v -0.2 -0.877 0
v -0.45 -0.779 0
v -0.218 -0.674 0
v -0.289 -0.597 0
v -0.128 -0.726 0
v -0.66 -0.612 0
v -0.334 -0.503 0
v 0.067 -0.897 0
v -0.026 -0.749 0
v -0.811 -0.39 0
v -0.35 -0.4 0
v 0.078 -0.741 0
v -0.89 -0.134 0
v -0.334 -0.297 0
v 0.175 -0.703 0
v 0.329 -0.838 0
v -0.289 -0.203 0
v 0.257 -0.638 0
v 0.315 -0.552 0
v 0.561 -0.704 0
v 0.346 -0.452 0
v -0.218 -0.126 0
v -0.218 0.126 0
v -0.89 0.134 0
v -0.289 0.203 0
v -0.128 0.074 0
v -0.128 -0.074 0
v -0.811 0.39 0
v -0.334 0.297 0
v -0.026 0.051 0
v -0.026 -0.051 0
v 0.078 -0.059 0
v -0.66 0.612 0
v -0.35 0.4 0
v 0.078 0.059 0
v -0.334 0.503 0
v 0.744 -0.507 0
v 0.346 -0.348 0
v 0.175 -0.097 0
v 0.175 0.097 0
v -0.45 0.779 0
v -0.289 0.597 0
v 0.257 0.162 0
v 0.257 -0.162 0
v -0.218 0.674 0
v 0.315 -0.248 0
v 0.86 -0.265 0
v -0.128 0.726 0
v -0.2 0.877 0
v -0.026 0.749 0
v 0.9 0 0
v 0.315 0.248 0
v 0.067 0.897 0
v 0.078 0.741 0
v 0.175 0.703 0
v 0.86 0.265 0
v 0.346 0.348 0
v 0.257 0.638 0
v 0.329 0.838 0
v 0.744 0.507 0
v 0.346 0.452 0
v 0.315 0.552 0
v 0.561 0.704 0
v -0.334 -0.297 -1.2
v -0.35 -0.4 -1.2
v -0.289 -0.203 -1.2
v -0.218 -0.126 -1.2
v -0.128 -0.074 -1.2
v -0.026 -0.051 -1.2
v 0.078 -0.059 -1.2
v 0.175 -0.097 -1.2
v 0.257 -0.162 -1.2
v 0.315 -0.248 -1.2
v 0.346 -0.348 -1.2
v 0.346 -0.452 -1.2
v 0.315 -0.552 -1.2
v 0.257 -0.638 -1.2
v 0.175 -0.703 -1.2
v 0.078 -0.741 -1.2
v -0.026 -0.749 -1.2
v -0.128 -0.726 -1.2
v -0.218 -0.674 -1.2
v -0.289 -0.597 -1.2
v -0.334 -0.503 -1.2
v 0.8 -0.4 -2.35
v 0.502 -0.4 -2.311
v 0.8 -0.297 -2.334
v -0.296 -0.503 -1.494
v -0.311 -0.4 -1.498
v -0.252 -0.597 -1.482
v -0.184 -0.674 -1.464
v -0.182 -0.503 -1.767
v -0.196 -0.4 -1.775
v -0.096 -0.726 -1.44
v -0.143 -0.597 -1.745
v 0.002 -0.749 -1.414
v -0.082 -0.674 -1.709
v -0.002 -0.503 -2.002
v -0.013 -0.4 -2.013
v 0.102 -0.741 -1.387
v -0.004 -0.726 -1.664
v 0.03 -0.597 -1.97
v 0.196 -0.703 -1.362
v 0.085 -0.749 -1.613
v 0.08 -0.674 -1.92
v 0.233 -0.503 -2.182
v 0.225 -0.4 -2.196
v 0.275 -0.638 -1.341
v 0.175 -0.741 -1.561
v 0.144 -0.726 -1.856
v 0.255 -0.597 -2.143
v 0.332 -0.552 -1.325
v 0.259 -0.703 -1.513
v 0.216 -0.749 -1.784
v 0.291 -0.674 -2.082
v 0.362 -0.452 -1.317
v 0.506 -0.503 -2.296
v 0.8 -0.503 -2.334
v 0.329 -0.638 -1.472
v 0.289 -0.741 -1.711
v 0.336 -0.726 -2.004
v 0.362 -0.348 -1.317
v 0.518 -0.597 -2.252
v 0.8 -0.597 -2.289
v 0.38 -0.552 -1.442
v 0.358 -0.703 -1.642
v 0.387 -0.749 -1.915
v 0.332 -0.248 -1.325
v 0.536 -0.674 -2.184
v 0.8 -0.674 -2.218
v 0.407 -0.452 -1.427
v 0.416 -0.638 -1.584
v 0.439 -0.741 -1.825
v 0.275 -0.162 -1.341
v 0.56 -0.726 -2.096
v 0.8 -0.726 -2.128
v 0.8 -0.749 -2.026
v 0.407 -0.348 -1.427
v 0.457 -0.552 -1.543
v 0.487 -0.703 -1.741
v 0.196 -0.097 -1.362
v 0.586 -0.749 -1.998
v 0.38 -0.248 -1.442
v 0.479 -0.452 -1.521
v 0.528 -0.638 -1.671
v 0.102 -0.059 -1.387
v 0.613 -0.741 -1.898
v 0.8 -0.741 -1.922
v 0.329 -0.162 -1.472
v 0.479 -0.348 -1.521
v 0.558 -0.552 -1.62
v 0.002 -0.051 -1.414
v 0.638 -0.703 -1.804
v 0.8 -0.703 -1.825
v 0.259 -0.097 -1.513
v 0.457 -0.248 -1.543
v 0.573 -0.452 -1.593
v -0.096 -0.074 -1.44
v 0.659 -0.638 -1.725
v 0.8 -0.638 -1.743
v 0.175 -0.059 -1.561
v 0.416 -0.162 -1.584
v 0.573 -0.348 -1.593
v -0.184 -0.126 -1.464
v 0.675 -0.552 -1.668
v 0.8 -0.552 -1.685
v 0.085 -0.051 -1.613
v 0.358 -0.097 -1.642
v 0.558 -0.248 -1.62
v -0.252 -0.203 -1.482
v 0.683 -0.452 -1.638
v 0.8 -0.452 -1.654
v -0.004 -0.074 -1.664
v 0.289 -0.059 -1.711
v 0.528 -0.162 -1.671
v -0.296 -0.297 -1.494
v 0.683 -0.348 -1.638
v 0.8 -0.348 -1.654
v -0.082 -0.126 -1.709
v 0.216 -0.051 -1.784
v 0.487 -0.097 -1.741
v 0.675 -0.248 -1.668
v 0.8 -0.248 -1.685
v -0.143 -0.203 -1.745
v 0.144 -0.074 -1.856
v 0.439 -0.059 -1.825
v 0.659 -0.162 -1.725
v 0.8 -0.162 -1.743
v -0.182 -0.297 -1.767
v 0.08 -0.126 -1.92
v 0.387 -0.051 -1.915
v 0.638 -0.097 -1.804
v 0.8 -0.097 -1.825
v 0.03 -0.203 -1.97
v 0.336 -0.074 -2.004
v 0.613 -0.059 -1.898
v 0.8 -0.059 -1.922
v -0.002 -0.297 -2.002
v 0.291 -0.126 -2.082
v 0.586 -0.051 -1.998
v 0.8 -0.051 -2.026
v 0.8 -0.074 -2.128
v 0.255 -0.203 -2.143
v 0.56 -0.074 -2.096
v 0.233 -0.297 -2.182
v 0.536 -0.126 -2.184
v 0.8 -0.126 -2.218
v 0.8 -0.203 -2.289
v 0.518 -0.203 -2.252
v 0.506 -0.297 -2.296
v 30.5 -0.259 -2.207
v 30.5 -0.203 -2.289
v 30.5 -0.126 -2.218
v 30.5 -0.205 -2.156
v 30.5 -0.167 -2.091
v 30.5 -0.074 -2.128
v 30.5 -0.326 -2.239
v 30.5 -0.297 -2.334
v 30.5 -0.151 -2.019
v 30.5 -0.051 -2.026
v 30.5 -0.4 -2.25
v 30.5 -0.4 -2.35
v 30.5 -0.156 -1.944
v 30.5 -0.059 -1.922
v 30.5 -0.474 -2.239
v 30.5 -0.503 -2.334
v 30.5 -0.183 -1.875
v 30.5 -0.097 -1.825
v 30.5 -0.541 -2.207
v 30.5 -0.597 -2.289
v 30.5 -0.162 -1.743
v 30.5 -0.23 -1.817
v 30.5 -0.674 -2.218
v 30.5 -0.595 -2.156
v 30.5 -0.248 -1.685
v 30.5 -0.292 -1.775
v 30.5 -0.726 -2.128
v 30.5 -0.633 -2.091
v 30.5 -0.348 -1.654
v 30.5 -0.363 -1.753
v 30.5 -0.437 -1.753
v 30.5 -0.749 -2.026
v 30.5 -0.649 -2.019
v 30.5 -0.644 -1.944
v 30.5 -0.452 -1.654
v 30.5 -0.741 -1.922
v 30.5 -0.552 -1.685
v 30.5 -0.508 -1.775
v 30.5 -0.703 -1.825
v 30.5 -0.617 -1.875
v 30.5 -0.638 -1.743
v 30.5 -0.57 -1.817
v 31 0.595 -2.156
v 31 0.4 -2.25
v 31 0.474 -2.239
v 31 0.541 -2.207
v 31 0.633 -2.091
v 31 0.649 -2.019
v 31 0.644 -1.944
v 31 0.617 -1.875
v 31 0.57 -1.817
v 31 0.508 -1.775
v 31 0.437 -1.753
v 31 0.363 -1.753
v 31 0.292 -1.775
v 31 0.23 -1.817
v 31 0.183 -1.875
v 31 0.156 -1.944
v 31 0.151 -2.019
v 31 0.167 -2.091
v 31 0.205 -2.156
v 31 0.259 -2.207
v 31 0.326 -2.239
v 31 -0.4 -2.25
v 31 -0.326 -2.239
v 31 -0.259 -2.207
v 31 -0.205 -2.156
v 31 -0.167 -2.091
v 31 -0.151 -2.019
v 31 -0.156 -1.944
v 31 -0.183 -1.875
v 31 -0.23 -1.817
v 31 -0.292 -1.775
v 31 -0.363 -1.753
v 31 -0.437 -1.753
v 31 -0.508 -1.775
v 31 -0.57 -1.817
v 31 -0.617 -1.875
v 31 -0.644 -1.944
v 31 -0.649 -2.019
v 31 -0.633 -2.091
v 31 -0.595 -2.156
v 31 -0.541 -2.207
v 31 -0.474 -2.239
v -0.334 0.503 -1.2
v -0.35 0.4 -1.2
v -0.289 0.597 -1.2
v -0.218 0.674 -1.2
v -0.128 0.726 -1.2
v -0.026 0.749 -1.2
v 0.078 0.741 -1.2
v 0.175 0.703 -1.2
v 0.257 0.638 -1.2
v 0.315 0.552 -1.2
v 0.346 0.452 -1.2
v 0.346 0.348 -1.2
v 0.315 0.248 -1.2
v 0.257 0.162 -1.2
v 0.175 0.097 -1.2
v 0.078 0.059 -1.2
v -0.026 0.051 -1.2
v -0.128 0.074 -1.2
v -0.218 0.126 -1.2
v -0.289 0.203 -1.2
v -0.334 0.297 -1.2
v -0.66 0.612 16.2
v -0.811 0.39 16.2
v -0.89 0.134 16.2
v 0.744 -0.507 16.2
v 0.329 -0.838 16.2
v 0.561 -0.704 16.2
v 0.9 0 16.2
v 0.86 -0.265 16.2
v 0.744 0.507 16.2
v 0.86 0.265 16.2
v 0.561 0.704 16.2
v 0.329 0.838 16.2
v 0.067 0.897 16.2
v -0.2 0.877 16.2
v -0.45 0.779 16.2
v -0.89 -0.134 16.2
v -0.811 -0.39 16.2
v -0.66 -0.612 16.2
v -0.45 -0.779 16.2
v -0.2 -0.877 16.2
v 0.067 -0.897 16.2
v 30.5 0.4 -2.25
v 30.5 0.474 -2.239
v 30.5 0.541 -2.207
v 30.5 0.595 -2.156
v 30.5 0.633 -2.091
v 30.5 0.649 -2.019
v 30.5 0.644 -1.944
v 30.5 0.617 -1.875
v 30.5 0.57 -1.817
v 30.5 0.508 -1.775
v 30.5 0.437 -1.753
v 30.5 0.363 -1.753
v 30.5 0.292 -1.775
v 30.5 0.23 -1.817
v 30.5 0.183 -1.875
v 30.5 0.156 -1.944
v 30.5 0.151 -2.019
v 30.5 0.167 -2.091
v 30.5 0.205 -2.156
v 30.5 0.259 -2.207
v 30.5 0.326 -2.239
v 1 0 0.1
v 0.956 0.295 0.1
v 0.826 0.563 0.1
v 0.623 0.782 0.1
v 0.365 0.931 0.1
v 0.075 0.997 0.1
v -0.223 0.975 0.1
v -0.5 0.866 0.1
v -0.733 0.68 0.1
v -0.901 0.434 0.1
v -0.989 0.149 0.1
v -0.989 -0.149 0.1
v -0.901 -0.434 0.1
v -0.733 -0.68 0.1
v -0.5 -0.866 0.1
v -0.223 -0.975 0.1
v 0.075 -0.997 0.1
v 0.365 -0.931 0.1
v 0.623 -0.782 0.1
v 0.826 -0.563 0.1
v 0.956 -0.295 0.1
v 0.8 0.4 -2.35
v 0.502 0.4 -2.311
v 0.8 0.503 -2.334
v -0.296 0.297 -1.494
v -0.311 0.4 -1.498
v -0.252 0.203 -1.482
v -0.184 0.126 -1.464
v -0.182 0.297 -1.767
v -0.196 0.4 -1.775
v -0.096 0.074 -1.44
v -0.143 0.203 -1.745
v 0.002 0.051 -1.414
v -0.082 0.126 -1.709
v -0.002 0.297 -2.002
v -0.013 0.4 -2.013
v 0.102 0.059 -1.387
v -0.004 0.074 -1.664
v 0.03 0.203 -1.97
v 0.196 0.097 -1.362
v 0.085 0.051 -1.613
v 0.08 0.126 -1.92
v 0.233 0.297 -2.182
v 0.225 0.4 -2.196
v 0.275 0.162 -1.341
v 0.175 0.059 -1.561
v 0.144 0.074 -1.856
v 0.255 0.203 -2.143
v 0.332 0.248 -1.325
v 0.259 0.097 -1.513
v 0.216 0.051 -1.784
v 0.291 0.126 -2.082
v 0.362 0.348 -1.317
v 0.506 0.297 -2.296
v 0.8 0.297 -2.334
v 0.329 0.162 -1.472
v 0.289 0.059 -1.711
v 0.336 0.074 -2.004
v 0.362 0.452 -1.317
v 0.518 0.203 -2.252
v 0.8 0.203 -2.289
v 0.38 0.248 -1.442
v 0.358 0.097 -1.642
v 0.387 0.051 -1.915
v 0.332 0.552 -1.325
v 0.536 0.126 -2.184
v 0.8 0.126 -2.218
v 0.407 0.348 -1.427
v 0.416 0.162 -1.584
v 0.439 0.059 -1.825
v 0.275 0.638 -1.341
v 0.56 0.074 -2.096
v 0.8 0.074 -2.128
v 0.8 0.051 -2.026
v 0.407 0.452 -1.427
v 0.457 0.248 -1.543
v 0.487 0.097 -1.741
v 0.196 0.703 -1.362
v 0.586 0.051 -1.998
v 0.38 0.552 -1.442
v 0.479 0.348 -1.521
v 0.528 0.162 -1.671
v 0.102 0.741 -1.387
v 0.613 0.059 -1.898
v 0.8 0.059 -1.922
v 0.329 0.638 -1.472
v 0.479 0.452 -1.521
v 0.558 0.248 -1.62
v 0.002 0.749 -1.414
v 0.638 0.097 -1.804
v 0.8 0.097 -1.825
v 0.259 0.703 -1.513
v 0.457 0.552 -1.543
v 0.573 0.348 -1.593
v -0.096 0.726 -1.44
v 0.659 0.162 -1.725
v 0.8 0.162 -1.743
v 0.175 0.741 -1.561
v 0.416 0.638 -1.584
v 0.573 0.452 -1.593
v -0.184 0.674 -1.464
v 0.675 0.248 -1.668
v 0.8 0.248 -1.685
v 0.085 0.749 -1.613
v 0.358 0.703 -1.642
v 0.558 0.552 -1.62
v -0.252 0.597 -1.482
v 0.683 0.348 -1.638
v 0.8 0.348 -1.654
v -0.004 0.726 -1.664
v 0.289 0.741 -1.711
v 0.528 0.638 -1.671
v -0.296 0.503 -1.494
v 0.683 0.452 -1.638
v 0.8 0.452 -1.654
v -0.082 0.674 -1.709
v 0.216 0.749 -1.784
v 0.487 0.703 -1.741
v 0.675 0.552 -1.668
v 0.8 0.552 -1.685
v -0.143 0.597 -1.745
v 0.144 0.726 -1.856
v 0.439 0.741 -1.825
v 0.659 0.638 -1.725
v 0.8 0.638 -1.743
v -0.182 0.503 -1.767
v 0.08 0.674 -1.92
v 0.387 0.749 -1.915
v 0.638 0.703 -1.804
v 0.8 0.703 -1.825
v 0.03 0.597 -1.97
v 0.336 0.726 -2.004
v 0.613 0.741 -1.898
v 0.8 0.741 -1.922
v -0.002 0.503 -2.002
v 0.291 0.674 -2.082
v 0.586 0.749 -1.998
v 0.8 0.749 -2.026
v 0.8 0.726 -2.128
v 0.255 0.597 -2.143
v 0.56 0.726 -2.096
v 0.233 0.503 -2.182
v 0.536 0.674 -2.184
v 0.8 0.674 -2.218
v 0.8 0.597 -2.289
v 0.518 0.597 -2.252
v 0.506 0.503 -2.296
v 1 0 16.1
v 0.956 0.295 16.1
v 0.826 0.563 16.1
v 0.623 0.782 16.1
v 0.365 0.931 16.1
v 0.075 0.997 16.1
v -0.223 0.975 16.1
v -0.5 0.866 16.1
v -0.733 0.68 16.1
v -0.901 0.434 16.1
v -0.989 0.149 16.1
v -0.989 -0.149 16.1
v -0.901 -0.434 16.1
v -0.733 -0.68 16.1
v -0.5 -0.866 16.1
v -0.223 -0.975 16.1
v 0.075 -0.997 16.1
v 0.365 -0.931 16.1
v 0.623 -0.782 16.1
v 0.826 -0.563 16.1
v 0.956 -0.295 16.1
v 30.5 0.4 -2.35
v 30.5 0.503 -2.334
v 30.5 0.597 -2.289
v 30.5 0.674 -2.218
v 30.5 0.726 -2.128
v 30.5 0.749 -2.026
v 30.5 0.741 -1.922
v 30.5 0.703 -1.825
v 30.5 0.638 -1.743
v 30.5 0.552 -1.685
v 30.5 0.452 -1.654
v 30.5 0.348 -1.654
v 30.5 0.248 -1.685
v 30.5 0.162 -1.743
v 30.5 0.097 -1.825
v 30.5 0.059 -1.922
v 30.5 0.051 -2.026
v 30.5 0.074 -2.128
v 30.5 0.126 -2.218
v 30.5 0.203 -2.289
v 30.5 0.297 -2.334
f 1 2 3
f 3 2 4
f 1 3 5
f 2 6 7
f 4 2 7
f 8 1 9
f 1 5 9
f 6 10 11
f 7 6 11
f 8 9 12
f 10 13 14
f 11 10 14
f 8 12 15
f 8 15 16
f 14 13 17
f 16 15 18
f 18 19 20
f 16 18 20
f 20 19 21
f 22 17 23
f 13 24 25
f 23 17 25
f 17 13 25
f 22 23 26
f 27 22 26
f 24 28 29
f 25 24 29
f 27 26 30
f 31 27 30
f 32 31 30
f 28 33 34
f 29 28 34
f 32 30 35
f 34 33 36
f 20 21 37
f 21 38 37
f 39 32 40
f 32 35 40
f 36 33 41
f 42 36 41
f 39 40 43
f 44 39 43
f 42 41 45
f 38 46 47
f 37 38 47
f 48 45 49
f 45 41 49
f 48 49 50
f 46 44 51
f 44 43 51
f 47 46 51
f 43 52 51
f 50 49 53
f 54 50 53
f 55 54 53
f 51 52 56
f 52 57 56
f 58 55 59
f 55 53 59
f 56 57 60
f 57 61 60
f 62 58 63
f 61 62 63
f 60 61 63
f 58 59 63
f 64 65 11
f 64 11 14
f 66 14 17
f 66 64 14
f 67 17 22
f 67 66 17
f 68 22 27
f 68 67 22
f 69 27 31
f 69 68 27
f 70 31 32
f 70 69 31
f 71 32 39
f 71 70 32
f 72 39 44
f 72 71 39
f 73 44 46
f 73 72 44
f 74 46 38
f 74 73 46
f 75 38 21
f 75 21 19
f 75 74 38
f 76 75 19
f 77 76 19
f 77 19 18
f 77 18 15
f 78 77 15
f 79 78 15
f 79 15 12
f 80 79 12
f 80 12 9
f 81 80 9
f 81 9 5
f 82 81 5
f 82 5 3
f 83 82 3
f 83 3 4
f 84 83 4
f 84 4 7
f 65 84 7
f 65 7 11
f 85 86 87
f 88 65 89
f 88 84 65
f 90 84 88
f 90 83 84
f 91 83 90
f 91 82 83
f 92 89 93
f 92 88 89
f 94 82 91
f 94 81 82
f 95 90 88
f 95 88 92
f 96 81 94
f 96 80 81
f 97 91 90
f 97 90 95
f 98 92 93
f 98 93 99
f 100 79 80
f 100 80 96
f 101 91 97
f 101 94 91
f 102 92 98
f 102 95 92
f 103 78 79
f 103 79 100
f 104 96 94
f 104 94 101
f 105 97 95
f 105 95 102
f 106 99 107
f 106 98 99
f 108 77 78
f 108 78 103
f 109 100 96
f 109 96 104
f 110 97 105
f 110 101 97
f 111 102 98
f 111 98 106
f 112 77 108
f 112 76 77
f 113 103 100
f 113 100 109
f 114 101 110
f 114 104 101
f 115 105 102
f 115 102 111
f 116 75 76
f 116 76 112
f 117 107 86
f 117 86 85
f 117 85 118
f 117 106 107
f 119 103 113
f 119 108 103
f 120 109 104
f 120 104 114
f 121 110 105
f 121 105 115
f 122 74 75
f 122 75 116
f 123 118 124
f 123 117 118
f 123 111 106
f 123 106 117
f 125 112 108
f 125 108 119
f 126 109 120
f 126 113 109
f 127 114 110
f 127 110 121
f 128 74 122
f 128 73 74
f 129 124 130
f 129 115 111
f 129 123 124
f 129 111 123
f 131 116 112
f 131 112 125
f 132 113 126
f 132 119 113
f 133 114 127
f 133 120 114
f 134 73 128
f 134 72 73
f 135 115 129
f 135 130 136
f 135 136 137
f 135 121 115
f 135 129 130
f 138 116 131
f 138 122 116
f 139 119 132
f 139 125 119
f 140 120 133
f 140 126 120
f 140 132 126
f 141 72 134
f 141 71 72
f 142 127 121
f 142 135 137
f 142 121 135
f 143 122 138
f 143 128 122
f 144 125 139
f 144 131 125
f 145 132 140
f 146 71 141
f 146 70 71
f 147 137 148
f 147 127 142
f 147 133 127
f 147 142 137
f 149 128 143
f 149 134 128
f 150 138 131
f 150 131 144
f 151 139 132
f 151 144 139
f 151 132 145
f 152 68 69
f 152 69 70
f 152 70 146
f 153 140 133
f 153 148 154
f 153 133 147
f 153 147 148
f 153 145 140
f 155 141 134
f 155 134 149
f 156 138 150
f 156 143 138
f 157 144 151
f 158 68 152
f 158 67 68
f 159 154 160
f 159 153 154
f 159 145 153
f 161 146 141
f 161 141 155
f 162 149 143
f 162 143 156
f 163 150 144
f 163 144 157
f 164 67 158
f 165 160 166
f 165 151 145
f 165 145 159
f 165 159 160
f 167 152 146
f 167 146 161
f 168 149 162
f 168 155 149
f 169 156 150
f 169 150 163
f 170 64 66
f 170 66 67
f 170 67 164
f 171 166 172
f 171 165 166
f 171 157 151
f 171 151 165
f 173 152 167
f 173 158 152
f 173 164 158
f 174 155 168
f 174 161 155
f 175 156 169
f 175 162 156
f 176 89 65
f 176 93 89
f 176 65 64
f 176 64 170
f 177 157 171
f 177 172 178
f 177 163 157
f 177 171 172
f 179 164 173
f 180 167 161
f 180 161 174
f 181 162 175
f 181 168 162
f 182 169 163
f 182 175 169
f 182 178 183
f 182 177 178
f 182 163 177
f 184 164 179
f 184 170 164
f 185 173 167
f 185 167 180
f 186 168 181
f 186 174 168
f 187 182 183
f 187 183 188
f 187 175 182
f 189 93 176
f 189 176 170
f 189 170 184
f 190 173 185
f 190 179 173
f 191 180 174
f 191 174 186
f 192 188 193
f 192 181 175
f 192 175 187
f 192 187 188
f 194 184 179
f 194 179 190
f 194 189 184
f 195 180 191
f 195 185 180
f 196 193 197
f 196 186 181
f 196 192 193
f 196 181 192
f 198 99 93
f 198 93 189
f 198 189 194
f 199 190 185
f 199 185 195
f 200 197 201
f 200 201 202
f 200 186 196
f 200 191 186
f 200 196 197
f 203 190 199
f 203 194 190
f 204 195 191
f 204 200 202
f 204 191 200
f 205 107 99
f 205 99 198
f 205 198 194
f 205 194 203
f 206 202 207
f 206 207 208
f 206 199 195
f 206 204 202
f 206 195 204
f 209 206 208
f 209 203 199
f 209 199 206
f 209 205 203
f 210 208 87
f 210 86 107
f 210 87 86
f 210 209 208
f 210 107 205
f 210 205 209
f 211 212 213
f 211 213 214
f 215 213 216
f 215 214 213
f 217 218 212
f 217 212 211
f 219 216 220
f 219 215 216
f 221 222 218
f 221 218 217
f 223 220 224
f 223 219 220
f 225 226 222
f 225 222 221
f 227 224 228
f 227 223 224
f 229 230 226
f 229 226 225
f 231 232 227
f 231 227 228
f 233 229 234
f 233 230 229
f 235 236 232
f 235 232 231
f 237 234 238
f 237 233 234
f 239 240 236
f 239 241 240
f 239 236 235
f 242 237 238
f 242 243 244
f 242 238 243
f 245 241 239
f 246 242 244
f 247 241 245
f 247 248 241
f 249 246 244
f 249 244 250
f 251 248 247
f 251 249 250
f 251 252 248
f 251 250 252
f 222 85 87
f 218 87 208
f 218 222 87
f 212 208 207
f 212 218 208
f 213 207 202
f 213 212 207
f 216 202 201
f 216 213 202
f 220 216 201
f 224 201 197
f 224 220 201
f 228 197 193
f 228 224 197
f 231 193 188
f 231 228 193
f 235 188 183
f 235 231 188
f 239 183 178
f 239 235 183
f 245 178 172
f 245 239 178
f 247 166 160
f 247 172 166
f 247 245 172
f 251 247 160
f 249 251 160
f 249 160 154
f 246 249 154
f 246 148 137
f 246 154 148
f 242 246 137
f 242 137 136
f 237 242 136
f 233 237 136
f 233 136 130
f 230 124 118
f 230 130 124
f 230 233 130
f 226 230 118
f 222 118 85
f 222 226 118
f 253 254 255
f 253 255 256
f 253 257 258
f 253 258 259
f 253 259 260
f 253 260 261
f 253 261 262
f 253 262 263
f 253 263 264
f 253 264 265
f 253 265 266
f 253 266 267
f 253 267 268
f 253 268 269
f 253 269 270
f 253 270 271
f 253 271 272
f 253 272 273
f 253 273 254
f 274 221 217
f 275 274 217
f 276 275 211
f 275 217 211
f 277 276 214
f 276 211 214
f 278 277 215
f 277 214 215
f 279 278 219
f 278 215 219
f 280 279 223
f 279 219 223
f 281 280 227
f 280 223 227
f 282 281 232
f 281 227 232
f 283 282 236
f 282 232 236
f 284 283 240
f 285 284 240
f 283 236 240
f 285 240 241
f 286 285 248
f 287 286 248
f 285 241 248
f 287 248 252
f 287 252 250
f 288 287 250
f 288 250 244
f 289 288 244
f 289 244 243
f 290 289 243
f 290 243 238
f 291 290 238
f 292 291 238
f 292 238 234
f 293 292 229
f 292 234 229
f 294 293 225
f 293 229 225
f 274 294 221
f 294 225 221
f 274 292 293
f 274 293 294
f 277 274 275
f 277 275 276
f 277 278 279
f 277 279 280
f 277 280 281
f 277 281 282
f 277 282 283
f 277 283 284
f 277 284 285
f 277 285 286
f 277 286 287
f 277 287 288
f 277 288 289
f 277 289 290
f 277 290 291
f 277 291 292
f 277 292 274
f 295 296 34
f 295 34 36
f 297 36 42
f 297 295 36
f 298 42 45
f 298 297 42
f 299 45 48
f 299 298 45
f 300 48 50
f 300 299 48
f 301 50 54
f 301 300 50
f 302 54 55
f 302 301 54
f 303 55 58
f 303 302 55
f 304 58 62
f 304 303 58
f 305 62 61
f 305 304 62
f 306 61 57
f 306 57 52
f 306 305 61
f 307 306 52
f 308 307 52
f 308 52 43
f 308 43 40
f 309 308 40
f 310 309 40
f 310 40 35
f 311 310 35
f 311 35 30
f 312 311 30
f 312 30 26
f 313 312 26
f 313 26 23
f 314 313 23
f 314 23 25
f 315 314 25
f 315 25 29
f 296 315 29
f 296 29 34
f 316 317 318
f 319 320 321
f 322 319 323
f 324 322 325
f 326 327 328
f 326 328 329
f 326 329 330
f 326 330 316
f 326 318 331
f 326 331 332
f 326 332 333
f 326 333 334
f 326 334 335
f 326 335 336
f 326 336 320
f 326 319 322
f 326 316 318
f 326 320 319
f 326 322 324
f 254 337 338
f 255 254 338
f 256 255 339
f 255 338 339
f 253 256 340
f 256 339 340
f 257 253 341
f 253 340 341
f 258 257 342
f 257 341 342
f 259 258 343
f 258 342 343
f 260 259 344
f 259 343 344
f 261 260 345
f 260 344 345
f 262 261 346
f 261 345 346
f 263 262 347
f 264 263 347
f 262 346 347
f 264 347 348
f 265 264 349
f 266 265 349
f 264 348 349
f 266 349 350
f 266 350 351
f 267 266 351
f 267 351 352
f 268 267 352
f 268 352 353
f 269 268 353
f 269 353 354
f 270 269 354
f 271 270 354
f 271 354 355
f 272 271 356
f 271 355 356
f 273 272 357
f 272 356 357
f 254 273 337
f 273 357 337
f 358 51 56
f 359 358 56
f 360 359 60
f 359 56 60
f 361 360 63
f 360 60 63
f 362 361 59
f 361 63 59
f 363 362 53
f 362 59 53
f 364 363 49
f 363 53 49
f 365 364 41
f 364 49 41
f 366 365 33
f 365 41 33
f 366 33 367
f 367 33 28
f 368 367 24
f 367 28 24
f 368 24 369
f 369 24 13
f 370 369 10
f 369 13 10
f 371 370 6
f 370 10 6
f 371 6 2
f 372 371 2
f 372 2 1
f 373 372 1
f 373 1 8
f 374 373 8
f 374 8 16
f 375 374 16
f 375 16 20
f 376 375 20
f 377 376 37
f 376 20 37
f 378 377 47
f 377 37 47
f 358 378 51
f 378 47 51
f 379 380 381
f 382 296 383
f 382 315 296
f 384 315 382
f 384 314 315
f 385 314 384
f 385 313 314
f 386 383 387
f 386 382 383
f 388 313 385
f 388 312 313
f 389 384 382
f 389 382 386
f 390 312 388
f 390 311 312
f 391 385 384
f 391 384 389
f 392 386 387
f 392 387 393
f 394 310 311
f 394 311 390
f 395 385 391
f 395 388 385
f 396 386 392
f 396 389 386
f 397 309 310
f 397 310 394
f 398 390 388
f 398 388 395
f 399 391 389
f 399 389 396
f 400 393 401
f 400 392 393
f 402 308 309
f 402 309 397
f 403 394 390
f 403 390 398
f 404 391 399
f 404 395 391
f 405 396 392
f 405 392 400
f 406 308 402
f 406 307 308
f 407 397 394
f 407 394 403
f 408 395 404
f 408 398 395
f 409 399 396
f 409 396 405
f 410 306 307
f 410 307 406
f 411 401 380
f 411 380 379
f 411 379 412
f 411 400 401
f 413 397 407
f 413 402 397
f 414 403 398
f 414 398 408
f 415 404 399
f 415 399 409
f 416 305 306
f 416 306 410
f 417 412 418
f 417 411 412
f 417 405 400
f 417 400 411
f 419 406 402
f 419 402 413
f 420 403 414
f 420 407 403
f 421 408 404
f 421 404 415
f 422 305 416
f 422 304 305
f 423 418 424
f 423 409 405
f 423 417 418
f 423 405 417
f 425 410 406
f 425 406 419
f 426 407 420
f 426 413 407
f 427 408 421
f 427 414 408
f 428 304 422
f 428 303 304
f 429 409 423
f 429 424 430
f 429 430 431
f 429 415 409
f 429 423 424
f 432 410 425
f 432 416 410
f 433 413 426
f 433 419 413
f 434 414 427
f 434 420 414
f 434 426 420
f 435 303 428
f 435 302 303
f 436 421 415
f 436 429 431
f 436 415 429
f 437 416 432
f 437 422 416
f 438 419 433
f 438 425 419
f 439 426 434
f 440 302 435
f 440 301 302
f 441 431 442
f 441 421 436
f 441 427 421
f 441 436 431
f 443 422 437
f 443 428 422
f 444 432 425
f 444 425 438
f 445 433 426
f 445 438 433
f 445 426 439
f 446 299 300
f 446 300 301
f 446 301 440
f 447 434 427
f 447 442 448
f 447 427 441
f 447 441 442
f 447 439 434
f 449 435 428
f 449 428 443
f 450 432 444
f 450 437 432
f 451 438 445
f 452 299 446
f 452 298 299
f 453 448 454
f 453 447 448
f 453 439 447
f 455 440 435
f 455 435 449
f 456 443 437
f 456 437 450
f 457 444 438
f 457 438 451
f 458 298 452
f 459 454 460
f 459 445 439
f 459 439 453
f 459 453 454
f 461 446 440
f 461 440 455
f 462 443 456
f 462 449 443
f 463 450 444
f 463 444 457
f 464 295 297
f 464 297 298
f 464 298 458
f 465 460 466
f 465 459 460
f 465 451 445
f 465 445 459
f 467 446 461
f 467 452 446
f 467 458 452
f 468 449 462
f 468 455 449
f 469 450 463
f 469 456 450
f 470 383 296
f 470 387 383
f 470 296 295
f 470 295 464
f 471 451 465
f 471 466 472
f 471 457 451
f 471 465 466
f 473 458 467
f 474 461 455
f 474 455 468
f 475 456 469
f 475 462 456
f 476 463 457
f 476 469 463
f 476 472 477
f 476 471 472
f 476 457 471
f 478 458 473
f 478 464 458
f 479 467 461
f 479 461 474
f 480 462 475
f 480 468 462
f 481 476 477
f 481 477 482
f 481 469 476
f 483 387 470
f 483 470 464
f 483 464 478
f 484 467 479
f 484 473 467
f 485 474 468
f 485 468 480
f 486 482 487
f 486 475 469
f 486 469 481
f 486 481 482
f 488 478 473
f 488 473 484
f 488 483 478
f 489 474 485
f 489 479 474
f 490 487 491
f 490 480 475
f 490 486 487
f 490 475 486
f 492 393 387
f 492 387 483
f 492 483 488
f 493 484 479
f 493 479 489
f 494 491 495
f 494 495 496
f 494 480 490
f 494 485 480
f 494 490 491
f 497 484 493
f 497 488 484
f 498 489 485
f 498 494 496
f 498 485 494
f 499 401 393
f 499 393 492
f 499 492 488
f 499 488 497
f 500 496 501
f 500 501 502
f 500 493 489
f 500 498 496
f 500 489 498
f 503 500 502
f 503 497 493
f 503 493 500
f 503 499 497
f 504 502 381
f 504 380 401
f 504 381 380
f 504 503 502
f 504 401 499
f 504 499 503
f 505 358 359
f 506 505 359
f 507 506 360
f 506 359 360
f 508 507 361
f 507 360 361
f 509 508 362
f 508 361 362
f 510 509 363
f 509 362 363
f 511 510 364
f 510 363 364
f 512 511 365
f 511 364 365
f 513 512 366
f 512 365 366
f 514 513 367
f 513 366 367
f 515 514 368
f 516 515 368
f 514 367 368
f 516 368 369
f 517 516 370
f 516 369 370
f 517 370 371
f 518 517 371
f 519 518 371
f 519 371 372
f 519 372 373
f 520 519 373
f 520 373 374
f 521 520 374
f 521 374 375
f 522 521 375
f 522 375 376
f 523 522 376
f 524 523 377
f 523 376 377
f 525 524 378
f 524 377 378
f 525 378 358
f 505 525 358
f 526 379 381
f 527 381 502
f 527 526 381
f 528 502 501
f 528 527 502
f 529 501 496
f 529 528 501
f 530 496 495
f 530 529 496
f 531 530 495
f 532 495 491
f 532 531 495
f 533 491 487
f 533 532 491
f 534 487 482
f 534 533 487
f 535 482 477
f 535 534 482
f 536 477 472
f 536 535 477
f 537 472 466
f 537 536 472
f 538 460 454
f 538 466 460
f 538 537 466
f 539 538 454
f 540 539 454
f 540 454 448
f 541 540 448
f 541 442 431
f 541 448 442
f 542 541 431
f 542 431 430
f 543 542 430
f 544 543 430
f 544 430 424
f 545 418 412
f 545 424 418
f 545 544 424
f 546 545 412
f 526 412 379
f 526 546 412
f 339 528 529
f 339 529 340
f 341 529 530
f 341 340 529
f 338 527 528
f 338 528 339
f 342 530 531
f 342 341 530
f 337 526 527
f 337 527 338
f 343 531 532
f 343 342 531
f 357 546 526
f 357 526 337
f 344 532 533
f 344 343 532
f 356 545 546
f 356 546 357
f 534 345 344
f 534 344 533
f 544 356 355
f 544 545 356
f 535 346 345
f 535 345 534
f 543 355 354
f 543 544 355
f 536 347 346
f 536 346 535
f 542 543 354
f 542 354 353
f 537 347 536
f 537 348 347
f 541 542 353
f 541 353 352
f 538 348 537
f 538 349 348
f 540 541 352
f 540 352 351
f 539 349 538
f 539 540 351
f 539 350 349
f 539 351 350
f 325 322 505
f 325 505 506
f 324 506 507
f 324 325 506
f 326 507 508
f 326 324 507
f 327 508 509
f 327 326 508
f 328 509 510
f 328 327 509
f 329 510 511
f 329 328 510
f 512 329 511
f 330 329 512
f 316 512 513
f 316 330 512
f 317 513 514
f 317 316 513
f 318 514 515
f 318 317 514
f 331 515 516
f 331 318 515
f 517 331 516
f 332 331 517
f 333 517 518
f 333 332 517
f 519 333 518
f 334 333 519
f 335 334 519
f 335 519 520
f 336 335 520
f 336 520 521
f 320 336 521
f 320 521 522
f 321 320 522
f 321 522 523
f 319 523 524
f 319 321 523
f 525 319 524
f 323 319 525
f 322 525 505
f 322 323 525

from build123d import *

# Parameters (mm, degrees)
SKETCH1_R           = 1
CASING_DEPTH        = 16.2
CASING_CHAMFER_SIZE = 0.1
SKETCH3_R           = 0.35
SKETCH4_R           = 0.25
EXPOSED_WIRE_DEPTH  = 0.5


with BuildPart() as part:
    # Sketch1 → Casing (new body)
    with BuildSketch(Plane.XY):
        Circle(SKETCH1_R)
    extrude(amount=CASING_DEPTH)

    # Casing Chamfer
    casing_chamfer_edges = [part.edges().sort_by_distance(p)[0] for p in [
        (-1, 0, 0),
        (-1, 0, 16.2),
    ]]
    chamfer(casing_chamfer_edges, length=CASING_CHAMFER_SIZE)

    # Wire 2: sweep along a path in Sketch2
    with BuildLine(Plane(origin=(0, 0, 0), x_dir=(1, 0, 0), z_dir=(0, 1, 0))) as wire_2_path:
        Line((0, 0), (0, 1.2))
        ThreePointArc((0, 1.2), (0.234314575, 1.765685425), (0.8, 2))
        Line((0.8, 2), (30.5, 2))
    # Sketch3 → Wire 2 (sweep)
    with BuildSketch(Plane(origin=(0, 0, 0), x_dir=(-1, 0, 0), z_dir=(0, 0, -1))):
        with Locations((0, -0.4)):
            Circle(SKETCH3_R)
        with Locations((0, 0.4)):
            Circle(SKETCH3_R)
    sweep(path=wire_2_path.line)

    # Sketch4 → Exposed Wire (add)
    with BuildSketch(Plane(origin=(30.5, 0, 0), x_dir=(0, 0, -1), z_dir=(1, 0, 0))):
        with Locations((2, 0.4)):
            Circle(SKETCH4_R)
        with Locations((2, -0.4)):
            Circle(SKETCH4_R)
    extrude(amount=EXPOSED_WIRE_DEPTH)


solid = part.part
